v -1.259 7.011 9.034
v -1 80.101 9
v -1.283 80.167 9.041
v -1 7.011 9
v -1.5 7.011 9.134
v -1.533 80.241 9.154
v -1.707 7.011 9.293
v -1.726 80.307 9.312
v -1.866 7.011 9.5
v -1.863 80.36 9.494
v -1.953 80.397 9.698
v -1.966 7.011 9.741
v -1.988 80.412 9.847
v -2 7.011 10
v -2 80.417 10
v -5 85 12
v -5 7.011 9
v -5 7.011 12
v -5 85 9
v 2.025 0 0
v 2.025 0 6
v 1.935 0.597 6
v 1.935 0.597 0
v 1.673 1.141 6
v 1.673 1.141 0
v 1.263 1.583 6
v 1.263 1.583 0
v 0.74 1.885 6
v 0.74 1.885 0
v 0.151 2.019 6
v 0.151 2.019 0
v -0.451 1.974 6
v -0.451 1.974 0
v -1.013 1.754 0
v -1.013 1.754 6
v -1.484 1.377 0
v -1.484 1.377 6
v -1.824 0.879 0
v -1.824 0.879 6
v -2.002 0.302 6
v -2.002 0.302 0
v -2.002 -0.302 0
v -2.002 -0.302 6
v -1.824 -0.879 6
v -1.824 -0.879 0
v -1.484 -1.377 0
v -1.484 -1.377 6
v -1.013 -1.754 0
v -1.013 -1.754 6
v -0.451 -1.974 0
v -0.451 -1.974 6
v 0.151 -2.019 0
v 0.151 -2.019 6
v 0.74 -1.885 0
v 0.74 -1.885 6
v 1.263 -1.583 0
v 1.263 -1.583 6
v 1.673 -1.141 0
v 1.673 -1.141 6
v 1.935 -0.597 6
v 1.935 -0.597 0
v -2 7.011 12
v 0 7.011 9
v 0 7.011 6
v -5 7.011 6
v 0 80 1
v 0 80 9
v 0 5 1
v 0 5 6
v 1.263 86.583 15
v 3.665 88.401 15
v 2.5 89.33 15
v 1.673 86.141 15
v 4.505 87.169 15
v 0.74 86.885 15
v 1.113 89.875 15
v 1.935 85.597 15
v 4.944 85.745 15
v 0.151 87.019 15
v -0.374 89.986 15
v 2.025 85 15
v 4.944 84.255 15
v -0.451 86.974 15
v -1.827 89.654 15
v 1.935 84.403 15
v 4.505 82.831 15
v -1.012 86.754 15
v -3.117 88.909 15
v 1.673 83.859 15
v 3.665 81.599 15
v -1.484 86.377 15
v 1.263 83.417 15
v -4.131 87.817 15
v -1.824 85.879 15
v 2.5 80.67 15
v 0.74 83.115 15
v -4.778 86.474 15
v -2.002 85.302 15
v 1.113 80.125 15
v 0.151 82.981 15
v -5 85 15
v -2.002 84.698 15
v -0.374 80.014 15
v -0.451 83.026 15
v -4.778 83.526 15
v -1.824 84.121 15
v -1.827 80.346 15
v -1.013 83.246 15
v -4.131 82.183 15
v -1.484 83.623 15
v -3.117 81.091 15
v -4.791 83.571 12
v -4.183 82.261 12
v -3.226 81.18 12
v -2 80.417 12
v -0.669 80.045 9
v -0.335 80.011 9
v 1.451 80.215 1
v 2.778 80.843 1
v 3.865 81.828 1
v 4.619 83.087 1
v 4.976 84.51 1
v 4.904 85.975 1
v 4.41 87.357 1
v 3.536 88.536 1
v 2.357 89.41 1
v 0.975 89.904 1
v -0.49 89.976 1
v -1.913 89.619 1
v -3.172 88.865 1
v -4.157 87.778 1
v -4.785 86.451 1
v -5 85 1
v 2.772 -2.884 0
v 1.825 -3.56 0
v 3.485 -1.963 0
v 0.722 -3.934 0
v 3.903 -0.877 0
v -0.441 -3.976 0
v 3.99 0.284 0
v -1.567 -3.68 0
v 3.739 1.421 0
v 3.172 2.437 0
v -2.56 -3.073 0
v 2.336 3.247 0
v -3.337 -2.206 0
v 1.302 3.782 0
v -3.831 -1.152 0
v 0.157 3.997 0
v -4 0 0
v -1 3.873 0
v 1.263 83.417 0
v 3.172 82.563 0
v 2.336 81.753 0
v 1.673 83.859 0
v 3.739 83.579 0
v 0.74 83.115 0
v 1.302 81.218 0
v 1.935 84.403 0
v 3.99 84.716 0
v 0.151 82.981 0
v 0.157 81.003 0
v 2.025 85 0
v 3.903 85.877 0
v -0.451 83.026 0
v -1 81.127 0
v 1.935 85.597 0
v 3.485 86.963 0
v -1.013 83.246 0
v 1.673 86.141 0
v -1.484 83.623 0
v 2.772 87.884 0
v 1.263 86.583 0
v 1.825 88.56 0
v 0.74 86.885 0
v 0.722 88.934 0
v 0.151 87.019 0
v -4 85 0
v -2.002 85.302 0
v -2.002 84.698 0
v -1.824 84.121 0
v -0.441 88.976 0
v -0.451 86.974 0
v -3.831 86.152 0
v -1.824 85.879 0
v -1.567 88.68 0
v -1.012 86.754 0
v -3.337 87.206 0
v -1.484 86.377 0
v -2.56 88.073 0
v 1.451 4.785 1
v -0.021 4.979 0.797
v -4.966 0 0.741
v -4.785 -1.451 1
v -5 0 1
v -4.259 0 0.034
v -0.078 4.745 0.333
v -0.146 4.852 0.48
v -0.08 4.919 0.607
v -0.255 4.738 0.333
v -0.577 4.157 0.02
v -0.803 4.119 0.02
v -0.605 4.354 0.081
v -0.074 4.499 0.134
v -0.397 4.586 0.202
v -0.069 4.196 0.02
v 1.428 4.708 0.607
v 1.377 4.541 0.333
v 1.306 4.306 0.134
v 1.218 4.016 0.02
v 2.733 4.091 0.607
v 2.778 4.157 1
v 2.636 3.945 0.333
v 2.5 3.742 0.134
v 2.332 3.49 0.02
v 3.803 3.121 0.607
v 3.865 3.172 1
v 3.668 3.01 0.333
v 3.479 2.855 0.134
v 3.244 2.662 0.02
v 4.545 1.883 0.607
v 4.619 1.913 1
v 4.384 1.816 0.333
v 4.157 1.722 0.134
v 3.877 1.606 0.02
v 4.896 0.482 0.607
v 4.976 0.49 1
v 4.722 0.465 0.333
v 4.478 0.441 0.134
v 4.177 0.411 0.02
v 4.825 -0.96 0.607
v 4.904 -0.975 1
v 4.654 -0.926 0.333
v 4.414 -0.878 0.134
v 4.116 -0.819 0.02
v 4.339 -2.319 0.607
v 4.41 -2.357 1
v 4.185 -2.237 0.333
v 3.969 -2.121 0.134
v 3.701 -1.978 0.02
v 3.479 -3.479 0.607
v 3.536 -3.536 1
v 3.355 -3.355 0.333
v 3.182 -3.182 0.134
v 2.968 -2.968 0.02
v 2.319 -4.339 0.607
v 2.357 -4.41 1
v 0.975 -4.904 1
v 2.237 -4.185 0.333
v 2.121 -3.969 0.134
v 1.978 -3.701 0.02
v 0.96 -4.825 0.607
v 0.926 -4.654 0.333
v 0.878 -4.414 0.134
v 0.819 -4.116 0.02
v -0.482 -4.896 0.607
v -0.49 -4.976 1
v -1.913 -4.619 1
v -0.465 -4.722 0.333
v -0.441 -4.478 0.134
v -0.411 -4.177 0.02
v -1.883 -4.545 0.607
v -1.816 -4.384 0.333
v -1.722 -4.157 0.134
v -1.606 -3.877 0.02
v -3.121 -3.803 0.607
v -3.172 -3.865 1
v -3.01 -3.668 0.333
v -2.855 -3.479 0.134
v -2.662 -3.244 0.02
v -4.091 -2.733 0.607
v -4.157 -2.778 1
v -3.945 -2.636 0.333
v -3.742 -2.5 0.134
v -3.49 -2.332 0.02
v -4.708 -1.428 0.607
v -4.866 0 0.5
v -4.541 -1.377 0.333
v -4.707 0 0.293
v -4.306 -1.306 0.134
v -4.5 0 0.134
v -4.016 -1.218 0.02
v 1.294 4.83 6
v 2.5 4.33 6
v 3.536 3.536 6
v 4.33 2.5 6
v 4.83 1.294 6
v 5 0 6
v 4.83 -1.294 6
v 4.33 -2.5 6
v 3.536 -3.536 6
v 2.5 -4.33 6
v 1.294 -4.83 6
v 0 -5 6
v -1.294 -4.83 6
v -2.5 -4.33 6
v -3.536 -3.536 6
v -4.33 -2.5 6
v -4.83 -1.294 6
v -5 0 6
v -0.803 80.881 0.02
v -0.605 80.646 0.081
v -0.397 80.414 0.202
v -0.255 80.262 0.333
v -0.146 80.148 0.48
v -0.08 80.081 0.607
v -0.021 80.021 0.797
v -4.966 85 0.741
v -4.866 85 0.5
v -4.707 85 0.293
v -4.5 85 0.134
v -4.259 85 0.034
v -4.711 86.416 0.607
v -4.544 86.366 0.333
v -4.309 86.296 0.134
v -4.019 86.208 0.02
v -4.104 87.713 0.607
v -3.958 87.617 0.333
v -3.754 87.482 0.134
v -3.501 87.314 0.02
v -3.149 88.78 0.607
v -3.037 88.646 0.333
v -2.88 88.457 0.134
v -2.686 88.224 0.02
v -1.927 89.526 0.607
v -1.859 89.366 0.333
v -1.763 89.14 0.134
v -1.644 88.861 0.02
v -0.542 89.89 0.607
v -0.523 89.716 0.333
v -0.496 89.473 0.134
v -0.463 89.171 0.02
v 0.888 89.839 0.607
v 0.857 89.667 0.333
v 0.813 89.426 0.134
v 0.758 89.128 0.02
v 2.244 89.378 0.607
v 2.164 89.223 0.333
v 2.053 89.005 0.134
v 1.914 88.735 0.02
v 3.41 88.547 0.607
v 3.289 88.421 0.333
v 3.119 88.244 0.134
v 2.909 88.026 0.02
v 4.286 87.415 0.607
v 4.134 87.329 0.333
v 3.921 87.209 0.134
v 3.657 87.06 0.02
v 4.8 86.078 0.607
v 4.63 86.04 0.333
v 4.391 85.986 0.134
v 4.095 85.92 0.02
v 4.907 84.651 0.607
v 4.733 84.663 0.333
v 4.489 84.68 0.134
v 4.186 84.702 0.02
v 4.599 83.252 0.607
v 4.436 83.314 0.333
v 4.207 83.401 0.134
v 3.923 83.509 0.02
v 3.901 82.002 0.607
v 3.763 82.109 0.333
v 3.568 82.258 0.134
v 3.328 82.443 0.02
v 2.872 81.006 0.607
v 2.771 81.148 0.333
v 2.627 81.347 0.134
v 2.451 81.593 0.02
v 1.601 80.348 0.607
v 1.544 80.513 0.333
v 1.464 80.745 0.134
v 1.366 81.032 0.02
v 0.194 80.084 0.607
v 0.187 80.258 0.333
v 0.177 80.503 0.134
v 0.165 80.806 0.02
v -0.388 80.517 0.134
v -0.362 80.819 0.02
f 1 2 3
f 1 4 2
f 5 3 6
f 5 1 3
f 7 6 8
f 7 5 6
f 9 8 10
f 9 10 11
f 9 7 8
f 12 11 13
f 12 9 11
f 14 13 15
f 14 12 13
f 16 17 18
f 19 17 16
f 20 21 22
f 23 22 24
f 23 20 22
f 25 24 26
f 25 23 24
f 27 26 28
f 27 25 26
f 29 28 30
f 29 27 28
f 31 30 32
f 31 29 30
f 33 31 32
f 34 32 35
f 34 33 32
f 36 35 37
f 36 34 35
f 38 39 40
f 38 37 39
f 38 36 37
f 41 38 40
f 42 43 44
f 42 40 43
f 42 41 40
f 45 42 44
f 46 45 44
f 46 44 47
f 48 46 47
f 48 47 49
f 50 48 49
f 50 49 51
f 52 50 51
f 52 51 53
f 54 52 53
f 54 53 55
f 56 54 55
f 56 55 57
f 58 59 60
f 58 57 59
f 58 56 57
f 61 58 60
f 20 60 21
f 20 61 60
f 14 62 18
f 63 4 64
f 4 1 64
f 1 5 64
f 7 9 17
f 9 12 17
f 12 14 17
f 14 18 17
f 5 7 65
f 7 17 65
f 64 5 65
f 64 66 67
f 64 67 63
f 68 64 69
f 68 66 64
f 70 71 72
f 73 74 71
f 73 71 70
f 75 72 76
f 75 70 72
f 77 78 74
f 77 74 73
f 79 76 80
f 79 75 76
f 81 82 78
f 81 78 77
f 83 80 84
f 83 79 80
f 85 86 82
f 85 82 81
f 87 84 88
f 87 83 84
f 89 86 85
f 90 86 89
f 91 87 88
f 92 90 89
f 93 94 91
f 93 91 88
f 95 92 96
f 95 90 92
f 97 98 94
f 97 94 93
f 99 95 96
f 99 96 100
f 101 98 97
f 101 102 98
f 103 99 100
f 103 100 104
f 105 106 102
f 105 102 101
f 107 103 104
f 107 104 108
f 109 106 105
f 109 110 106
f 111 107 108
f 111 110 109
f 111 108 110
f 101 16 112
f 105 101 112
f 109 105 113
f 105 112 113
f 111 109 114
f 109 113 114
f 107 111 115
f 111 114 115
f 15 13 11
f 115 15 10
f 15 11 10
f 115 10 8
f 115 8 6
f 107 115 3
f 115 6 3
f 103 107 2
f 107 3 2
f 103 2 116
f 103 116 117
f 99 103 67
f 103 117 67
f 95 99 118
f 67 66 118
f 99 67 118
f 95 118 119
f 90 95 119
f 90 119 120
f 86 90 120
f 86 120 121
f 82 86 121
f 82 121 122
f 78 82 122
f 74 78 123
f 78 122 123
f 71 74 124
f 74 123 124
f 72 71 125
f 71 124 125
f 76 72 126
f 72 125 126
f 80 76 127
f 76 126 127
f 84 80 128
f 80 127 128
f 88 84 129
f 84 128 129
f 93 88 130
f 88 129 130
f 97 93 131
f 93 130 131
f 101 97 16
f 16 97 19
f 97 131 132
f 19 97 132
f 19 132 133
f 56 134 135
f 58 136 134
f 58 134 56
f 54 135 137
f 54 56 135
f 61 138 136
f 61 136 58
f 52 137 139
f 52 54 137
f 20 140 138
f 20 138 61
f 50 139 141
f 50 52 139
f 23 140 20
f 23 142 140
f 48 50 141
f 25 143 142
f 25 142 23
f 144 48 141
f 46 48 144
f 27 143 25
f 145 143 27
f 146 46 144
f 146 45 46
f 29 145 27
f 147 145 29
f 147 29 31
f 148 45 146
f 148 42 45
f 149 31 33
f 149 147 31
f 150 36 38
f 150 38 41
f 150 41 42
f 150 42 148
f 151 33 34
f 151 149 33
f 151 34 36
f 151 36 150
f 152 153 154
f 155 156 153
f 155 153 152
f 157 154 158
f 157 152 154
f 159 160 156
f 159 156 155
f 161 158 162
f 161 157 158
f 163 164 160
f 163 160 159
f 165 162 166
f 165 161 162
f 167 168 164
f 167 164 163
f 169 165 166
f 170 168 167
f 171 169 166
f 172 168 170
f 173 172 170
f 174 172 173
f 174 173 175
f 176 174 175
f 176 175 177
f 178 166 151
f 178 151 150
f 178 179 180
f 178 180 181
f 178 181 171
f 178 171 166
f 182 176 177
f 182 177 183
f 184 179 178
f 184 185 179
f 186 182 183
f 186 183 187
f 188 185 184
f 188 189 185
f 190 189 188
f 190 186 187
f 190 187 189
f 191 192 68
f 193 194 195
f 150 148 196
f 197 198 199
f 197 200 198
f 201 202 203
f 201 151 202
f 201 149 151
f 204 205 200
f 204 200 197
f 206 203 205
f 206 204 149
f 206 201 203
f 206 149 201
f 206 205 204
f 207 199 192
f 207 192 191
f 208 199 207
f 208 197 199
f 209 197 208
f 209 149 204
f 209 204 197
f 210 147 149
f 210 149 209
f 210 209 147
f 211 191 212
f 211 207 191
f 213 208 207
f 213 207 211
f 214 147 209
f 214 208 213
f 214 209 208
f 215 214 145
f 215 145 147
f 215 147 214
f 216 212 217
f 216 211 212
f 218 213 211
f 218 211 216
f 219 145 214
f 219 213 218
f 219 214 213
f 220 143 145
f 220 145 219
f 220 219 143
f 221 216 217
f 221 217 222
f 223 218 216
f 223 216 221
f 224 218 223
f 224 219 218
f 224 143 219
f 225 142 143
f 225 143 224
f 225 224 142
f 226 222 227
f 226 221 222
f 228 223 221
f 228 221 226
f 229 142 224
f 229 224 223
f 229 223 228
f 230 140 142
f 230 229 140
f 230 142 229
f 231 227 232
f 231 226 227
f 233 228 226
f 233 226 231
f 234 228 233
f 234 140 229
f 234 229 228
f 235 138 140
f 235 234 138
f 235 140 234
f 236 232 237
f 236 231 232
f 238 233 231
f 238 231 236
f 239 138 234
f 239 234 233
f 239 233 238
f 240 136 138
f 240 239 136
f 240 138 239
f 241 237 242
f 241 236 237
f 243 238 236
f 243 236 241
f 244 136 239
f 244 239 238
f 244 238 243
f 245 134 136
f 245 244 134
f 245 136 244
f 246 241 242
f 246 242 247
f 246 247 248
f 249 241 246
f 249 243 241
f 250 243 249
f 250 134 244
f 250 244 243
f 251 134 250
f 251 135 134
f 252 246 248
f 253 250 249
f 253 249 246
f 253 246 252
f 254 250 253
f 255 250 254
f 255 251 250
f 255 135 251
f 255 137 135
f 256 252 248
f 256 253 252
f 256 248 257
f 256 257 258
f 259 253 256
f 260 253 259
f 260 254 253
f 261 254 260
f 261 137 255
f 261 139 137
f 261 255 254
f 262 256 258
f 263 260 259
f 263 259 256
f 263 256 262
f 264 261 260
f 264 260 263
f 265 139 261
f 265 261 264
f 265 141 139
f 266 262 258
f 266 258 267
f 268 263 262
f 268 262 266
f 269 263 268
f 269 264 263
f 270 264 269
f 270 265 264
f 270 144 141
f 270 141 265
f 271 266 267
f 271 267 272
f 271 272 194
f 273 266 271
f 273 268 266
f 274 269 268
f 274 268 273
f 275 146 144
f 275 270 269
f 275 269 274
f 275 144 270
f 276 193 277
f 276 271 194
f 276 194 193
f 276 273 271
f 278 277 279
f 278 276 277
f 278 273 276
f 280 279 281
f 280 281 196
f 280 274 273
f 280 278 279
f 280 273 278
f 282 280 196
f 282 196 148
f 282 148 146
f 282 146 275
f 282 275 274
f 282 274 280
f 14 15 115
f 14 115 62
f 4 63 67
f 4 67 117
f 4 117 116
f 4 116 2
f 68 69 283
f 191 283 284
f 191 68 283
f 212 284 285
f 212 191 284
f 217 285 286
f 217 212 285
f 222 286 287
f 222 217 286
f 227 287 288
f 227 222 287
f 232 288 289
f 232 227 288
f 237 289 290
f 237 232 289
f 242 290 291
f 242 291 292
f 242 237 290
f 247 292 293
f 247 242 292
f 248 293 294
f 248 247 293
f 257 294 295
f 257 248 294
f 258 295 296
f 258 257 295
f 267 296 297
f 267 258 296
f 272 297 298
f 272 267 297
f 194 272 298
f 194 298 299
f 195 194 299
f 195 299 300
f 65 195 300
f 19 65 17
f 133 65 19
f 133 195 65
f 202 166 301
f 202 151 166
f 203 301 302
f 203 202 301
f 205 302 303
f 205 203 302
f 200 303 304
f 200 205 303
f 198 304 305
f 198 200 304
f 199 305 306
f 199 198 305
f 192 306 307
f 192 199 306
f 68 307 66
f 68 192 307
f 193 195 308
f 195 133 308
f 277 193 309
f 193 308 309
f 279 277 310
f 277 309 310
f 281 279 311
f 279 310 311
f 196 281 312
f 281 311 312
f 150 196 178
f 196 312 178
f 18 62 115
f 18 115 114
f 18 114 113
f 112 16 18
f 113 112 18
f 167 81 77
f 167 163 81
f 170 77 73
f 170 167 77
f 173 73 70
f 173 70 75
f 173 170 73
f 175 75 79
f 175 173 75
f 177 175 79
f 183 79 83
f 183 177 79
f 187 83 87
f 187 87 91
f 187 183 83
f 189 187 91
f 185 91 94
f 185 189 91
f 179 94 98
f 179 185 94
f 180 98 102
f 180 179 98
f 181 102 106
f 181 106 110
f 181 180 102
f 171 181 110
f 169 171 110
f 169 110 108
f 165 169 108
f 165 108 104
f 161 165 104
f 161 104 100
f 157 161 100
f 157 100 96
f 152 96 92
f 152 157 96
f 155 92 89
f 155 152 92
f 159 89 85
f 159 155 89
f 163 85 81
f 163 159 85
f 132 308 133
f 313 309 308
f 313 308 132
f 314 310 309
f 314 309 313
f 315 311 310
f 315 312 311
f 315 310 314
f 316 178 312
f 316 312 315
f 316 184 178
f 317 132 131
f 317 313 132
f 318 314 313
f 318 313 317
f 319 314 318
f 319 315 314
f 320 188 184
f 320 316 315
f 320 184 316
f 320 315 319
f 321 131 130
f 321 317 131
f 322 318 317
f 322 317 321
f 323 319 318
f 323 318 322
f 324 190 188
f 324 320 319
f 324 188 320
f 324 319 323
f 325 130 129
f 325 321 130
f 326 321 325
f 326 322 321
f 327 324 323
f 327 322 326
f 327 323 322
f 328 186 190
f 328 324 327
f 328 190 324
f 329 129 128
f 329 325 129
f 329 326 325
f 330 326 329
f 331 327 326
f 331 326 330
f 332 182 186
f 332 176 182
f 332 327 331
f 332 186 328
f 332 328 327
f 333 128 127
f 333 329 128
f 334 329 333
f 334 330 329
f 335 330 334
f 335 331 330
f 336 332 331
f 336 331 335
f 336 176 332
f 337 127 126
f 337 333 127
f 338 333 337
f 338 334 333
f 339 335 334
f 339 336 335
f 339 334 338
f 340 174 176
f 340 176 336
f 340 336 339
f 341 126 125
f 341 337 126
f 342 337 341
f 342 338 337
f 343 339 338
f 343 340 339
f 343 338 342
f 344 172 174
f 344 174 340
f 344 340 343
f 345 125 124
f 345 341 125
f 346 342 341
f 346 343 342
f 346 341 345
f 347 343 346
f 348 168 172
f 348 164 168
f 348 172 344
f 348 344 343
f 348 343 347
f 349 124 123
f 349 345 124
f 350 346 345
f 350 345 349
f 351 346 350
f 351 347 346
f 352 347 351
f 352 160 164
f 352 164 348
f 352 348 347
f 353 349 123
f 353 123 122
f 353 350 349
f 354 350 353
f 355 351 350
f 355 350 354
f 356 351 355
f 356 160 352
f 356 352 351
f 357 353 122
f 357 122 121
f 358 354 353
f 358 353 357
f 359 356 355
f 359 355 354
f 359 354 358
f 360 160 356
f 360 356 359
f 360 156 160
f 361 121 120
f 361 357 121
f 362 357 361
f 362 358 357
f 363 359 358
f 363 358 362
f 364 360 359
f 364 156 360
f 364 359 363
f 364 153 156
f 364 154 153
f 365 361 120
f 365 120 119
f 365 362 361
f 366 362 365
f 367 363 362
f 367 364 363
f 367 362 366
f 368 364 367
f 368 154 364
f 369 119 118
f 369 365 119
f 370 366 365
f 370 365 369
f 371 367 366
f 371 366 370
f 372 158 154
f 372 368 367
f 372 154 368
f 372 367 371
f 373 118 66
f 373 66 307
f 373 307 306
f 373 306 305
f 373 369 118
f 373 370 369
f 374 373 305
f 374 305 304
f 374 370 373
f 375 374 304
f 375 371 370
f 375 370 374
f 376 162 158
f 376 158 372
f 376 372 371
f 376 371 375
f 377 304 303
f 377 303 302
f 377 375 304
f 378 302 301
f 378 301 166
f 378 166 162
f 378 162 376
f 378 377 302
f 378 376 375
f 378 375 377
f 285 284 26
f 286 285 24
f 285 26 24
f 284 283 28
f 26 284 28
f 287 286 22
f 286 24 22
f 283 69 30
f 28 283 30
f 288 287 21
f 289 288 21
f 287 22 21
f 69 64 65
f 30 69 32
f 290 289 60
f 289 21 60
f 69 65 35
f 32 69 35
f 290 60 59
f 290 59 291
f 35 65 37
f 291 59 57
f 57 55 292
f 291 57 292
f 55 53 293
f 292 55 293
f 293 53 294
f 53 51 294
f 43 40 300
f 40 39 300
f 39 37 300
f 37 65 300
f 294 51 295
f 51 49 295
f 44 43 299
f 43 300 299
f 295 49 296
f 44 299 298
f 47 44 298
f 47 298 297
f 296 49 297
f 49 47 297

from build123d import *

# Parameters (mm, degrees)
SKETCH1_R             = 2.024999999999999
SKETCH1_R_2           = 2.025
BOSS_EXTRUDE1_DEPTH   = 9
SKETCH2_R             = 5.0000000000000036
SKETCH2_R_2           = 2.024999999999999
BOSS_EXTRUDE2_DEPTH   = 6
SKETCH3_R             = 2.025
BOSS_EXTRUDE3_DEPTH   = 3
CORTAR_EXTRUIR3_DEPTH = 10
REDONDEO1_R           = 1
REDONDEO2_R           = 1


with BuildPart() as part:
    # Sketch1 → Boss-Extrude1 (new body)
    with BuildSketch(Plane.XY):
        with BuildLine():
            Line((-4.999999999999999, 0), (-5.000000000000001, 85))
            ThreePointArc((-5.000000000000001, 85), (3.535533905932748, 88.53553390593275), (0, 79.99999999999999))
            Line((0, 79.99999999999999), (0, 5))
            ThreePointArc((0, 5), (5, 0), (0, -5))
            ThreePointArc((0, -5), (-3.5355339059327378, -3.535533905932737), (-4.999999999999999, 0))
        make_face()
        with Locations((0, 85)):
            Circle(SKETCH1_R, mode=Mode.SUBTRACT)
        Circle(SKETCH1_R_2, mode=Mode.SUBTRACT)
    extrude(amount=BOSS_EXTRUDE1_DEPTH)

    # Sketch2 → Boss-Extrude2 (add)
    with BuildSketch(Plane.XY.offset(9)):
        with Locations(Location((0, 85, 0), (0, 0, 180))):
            Circle(SKETCH2_R)
        with Locations((0, 85)):
            Circle(SKETCH2_R_2, mode=Mode.SUBTRACT)
    extrude(amount=BOSS_EXTRUDE2_DEPTH)

    # Sketch3 → Boss-Extrude3 (add)
    with BuildSketch(Plane.XY.offset(9)):
        with BuildLine():
            Line((-4.999999999999999, 0), (-5.0000000000000036, 85))
            ThreePointArc((-5.0000000000000036, 85), (-4.183300132670382, 82.26138721247418), (-2.000000000000004, 80.41742430504416))
            Line((-2.000000000000004, 80.41742430504416), (-1.9999999999999958, 5))
            Line((-1.9999999999999958, 5), (0, 5))
            ThreePointArc((0, 5), (5, 0), (0, -5))
            ThreePointArc((0, -5), (-3.535533905932738, -3.535533905932736), (-4.999999999999999, 0))
        make_face()
        Circle(SKETCH3_R, mode=Mode.SUBTRACT)
    extrude(amount=BOSS_EXTRUDE3_DEPTH)

    # Croquis1 → Cortar-Extruir3 (cut)
    with BuildSketch(Plane.ZY.offset(4.999999999999999)):
        Polygon((12, 7.011251740053792), (6, 7.011251740053791), (6.000000000000002, -5.000000000000002), (12.000000000000002, -5.000000000000001), align=None)
    extrude(amount=-CORTAR_EXTRUIR3_DEPTH, mode=Mode.SUBTRACT)

    # Redondeo1
    redondeo1_edges = [part.edges().sort_by_distance(p)[0] for p in [
        (-5, 42.5, 0),
        (3.5355339059327653, 88.53553390593274, 0),
        (0, 42.49999999999999, 0),
        (3.5355339059327386, -3.535533905932737, 0),
    ]]
    fillet(redondeo1_edges, radius=REDONDEO1_R)

    # Redondeo2
    redondeo2_edges = [part.edges().sort_by_distance(p)[0] for p in [
        (-2, 43.71433802254898, 9),
    ]]
    fillet(redondeo2_edges, radius=REDONDEO2_R)


solid = part.part
